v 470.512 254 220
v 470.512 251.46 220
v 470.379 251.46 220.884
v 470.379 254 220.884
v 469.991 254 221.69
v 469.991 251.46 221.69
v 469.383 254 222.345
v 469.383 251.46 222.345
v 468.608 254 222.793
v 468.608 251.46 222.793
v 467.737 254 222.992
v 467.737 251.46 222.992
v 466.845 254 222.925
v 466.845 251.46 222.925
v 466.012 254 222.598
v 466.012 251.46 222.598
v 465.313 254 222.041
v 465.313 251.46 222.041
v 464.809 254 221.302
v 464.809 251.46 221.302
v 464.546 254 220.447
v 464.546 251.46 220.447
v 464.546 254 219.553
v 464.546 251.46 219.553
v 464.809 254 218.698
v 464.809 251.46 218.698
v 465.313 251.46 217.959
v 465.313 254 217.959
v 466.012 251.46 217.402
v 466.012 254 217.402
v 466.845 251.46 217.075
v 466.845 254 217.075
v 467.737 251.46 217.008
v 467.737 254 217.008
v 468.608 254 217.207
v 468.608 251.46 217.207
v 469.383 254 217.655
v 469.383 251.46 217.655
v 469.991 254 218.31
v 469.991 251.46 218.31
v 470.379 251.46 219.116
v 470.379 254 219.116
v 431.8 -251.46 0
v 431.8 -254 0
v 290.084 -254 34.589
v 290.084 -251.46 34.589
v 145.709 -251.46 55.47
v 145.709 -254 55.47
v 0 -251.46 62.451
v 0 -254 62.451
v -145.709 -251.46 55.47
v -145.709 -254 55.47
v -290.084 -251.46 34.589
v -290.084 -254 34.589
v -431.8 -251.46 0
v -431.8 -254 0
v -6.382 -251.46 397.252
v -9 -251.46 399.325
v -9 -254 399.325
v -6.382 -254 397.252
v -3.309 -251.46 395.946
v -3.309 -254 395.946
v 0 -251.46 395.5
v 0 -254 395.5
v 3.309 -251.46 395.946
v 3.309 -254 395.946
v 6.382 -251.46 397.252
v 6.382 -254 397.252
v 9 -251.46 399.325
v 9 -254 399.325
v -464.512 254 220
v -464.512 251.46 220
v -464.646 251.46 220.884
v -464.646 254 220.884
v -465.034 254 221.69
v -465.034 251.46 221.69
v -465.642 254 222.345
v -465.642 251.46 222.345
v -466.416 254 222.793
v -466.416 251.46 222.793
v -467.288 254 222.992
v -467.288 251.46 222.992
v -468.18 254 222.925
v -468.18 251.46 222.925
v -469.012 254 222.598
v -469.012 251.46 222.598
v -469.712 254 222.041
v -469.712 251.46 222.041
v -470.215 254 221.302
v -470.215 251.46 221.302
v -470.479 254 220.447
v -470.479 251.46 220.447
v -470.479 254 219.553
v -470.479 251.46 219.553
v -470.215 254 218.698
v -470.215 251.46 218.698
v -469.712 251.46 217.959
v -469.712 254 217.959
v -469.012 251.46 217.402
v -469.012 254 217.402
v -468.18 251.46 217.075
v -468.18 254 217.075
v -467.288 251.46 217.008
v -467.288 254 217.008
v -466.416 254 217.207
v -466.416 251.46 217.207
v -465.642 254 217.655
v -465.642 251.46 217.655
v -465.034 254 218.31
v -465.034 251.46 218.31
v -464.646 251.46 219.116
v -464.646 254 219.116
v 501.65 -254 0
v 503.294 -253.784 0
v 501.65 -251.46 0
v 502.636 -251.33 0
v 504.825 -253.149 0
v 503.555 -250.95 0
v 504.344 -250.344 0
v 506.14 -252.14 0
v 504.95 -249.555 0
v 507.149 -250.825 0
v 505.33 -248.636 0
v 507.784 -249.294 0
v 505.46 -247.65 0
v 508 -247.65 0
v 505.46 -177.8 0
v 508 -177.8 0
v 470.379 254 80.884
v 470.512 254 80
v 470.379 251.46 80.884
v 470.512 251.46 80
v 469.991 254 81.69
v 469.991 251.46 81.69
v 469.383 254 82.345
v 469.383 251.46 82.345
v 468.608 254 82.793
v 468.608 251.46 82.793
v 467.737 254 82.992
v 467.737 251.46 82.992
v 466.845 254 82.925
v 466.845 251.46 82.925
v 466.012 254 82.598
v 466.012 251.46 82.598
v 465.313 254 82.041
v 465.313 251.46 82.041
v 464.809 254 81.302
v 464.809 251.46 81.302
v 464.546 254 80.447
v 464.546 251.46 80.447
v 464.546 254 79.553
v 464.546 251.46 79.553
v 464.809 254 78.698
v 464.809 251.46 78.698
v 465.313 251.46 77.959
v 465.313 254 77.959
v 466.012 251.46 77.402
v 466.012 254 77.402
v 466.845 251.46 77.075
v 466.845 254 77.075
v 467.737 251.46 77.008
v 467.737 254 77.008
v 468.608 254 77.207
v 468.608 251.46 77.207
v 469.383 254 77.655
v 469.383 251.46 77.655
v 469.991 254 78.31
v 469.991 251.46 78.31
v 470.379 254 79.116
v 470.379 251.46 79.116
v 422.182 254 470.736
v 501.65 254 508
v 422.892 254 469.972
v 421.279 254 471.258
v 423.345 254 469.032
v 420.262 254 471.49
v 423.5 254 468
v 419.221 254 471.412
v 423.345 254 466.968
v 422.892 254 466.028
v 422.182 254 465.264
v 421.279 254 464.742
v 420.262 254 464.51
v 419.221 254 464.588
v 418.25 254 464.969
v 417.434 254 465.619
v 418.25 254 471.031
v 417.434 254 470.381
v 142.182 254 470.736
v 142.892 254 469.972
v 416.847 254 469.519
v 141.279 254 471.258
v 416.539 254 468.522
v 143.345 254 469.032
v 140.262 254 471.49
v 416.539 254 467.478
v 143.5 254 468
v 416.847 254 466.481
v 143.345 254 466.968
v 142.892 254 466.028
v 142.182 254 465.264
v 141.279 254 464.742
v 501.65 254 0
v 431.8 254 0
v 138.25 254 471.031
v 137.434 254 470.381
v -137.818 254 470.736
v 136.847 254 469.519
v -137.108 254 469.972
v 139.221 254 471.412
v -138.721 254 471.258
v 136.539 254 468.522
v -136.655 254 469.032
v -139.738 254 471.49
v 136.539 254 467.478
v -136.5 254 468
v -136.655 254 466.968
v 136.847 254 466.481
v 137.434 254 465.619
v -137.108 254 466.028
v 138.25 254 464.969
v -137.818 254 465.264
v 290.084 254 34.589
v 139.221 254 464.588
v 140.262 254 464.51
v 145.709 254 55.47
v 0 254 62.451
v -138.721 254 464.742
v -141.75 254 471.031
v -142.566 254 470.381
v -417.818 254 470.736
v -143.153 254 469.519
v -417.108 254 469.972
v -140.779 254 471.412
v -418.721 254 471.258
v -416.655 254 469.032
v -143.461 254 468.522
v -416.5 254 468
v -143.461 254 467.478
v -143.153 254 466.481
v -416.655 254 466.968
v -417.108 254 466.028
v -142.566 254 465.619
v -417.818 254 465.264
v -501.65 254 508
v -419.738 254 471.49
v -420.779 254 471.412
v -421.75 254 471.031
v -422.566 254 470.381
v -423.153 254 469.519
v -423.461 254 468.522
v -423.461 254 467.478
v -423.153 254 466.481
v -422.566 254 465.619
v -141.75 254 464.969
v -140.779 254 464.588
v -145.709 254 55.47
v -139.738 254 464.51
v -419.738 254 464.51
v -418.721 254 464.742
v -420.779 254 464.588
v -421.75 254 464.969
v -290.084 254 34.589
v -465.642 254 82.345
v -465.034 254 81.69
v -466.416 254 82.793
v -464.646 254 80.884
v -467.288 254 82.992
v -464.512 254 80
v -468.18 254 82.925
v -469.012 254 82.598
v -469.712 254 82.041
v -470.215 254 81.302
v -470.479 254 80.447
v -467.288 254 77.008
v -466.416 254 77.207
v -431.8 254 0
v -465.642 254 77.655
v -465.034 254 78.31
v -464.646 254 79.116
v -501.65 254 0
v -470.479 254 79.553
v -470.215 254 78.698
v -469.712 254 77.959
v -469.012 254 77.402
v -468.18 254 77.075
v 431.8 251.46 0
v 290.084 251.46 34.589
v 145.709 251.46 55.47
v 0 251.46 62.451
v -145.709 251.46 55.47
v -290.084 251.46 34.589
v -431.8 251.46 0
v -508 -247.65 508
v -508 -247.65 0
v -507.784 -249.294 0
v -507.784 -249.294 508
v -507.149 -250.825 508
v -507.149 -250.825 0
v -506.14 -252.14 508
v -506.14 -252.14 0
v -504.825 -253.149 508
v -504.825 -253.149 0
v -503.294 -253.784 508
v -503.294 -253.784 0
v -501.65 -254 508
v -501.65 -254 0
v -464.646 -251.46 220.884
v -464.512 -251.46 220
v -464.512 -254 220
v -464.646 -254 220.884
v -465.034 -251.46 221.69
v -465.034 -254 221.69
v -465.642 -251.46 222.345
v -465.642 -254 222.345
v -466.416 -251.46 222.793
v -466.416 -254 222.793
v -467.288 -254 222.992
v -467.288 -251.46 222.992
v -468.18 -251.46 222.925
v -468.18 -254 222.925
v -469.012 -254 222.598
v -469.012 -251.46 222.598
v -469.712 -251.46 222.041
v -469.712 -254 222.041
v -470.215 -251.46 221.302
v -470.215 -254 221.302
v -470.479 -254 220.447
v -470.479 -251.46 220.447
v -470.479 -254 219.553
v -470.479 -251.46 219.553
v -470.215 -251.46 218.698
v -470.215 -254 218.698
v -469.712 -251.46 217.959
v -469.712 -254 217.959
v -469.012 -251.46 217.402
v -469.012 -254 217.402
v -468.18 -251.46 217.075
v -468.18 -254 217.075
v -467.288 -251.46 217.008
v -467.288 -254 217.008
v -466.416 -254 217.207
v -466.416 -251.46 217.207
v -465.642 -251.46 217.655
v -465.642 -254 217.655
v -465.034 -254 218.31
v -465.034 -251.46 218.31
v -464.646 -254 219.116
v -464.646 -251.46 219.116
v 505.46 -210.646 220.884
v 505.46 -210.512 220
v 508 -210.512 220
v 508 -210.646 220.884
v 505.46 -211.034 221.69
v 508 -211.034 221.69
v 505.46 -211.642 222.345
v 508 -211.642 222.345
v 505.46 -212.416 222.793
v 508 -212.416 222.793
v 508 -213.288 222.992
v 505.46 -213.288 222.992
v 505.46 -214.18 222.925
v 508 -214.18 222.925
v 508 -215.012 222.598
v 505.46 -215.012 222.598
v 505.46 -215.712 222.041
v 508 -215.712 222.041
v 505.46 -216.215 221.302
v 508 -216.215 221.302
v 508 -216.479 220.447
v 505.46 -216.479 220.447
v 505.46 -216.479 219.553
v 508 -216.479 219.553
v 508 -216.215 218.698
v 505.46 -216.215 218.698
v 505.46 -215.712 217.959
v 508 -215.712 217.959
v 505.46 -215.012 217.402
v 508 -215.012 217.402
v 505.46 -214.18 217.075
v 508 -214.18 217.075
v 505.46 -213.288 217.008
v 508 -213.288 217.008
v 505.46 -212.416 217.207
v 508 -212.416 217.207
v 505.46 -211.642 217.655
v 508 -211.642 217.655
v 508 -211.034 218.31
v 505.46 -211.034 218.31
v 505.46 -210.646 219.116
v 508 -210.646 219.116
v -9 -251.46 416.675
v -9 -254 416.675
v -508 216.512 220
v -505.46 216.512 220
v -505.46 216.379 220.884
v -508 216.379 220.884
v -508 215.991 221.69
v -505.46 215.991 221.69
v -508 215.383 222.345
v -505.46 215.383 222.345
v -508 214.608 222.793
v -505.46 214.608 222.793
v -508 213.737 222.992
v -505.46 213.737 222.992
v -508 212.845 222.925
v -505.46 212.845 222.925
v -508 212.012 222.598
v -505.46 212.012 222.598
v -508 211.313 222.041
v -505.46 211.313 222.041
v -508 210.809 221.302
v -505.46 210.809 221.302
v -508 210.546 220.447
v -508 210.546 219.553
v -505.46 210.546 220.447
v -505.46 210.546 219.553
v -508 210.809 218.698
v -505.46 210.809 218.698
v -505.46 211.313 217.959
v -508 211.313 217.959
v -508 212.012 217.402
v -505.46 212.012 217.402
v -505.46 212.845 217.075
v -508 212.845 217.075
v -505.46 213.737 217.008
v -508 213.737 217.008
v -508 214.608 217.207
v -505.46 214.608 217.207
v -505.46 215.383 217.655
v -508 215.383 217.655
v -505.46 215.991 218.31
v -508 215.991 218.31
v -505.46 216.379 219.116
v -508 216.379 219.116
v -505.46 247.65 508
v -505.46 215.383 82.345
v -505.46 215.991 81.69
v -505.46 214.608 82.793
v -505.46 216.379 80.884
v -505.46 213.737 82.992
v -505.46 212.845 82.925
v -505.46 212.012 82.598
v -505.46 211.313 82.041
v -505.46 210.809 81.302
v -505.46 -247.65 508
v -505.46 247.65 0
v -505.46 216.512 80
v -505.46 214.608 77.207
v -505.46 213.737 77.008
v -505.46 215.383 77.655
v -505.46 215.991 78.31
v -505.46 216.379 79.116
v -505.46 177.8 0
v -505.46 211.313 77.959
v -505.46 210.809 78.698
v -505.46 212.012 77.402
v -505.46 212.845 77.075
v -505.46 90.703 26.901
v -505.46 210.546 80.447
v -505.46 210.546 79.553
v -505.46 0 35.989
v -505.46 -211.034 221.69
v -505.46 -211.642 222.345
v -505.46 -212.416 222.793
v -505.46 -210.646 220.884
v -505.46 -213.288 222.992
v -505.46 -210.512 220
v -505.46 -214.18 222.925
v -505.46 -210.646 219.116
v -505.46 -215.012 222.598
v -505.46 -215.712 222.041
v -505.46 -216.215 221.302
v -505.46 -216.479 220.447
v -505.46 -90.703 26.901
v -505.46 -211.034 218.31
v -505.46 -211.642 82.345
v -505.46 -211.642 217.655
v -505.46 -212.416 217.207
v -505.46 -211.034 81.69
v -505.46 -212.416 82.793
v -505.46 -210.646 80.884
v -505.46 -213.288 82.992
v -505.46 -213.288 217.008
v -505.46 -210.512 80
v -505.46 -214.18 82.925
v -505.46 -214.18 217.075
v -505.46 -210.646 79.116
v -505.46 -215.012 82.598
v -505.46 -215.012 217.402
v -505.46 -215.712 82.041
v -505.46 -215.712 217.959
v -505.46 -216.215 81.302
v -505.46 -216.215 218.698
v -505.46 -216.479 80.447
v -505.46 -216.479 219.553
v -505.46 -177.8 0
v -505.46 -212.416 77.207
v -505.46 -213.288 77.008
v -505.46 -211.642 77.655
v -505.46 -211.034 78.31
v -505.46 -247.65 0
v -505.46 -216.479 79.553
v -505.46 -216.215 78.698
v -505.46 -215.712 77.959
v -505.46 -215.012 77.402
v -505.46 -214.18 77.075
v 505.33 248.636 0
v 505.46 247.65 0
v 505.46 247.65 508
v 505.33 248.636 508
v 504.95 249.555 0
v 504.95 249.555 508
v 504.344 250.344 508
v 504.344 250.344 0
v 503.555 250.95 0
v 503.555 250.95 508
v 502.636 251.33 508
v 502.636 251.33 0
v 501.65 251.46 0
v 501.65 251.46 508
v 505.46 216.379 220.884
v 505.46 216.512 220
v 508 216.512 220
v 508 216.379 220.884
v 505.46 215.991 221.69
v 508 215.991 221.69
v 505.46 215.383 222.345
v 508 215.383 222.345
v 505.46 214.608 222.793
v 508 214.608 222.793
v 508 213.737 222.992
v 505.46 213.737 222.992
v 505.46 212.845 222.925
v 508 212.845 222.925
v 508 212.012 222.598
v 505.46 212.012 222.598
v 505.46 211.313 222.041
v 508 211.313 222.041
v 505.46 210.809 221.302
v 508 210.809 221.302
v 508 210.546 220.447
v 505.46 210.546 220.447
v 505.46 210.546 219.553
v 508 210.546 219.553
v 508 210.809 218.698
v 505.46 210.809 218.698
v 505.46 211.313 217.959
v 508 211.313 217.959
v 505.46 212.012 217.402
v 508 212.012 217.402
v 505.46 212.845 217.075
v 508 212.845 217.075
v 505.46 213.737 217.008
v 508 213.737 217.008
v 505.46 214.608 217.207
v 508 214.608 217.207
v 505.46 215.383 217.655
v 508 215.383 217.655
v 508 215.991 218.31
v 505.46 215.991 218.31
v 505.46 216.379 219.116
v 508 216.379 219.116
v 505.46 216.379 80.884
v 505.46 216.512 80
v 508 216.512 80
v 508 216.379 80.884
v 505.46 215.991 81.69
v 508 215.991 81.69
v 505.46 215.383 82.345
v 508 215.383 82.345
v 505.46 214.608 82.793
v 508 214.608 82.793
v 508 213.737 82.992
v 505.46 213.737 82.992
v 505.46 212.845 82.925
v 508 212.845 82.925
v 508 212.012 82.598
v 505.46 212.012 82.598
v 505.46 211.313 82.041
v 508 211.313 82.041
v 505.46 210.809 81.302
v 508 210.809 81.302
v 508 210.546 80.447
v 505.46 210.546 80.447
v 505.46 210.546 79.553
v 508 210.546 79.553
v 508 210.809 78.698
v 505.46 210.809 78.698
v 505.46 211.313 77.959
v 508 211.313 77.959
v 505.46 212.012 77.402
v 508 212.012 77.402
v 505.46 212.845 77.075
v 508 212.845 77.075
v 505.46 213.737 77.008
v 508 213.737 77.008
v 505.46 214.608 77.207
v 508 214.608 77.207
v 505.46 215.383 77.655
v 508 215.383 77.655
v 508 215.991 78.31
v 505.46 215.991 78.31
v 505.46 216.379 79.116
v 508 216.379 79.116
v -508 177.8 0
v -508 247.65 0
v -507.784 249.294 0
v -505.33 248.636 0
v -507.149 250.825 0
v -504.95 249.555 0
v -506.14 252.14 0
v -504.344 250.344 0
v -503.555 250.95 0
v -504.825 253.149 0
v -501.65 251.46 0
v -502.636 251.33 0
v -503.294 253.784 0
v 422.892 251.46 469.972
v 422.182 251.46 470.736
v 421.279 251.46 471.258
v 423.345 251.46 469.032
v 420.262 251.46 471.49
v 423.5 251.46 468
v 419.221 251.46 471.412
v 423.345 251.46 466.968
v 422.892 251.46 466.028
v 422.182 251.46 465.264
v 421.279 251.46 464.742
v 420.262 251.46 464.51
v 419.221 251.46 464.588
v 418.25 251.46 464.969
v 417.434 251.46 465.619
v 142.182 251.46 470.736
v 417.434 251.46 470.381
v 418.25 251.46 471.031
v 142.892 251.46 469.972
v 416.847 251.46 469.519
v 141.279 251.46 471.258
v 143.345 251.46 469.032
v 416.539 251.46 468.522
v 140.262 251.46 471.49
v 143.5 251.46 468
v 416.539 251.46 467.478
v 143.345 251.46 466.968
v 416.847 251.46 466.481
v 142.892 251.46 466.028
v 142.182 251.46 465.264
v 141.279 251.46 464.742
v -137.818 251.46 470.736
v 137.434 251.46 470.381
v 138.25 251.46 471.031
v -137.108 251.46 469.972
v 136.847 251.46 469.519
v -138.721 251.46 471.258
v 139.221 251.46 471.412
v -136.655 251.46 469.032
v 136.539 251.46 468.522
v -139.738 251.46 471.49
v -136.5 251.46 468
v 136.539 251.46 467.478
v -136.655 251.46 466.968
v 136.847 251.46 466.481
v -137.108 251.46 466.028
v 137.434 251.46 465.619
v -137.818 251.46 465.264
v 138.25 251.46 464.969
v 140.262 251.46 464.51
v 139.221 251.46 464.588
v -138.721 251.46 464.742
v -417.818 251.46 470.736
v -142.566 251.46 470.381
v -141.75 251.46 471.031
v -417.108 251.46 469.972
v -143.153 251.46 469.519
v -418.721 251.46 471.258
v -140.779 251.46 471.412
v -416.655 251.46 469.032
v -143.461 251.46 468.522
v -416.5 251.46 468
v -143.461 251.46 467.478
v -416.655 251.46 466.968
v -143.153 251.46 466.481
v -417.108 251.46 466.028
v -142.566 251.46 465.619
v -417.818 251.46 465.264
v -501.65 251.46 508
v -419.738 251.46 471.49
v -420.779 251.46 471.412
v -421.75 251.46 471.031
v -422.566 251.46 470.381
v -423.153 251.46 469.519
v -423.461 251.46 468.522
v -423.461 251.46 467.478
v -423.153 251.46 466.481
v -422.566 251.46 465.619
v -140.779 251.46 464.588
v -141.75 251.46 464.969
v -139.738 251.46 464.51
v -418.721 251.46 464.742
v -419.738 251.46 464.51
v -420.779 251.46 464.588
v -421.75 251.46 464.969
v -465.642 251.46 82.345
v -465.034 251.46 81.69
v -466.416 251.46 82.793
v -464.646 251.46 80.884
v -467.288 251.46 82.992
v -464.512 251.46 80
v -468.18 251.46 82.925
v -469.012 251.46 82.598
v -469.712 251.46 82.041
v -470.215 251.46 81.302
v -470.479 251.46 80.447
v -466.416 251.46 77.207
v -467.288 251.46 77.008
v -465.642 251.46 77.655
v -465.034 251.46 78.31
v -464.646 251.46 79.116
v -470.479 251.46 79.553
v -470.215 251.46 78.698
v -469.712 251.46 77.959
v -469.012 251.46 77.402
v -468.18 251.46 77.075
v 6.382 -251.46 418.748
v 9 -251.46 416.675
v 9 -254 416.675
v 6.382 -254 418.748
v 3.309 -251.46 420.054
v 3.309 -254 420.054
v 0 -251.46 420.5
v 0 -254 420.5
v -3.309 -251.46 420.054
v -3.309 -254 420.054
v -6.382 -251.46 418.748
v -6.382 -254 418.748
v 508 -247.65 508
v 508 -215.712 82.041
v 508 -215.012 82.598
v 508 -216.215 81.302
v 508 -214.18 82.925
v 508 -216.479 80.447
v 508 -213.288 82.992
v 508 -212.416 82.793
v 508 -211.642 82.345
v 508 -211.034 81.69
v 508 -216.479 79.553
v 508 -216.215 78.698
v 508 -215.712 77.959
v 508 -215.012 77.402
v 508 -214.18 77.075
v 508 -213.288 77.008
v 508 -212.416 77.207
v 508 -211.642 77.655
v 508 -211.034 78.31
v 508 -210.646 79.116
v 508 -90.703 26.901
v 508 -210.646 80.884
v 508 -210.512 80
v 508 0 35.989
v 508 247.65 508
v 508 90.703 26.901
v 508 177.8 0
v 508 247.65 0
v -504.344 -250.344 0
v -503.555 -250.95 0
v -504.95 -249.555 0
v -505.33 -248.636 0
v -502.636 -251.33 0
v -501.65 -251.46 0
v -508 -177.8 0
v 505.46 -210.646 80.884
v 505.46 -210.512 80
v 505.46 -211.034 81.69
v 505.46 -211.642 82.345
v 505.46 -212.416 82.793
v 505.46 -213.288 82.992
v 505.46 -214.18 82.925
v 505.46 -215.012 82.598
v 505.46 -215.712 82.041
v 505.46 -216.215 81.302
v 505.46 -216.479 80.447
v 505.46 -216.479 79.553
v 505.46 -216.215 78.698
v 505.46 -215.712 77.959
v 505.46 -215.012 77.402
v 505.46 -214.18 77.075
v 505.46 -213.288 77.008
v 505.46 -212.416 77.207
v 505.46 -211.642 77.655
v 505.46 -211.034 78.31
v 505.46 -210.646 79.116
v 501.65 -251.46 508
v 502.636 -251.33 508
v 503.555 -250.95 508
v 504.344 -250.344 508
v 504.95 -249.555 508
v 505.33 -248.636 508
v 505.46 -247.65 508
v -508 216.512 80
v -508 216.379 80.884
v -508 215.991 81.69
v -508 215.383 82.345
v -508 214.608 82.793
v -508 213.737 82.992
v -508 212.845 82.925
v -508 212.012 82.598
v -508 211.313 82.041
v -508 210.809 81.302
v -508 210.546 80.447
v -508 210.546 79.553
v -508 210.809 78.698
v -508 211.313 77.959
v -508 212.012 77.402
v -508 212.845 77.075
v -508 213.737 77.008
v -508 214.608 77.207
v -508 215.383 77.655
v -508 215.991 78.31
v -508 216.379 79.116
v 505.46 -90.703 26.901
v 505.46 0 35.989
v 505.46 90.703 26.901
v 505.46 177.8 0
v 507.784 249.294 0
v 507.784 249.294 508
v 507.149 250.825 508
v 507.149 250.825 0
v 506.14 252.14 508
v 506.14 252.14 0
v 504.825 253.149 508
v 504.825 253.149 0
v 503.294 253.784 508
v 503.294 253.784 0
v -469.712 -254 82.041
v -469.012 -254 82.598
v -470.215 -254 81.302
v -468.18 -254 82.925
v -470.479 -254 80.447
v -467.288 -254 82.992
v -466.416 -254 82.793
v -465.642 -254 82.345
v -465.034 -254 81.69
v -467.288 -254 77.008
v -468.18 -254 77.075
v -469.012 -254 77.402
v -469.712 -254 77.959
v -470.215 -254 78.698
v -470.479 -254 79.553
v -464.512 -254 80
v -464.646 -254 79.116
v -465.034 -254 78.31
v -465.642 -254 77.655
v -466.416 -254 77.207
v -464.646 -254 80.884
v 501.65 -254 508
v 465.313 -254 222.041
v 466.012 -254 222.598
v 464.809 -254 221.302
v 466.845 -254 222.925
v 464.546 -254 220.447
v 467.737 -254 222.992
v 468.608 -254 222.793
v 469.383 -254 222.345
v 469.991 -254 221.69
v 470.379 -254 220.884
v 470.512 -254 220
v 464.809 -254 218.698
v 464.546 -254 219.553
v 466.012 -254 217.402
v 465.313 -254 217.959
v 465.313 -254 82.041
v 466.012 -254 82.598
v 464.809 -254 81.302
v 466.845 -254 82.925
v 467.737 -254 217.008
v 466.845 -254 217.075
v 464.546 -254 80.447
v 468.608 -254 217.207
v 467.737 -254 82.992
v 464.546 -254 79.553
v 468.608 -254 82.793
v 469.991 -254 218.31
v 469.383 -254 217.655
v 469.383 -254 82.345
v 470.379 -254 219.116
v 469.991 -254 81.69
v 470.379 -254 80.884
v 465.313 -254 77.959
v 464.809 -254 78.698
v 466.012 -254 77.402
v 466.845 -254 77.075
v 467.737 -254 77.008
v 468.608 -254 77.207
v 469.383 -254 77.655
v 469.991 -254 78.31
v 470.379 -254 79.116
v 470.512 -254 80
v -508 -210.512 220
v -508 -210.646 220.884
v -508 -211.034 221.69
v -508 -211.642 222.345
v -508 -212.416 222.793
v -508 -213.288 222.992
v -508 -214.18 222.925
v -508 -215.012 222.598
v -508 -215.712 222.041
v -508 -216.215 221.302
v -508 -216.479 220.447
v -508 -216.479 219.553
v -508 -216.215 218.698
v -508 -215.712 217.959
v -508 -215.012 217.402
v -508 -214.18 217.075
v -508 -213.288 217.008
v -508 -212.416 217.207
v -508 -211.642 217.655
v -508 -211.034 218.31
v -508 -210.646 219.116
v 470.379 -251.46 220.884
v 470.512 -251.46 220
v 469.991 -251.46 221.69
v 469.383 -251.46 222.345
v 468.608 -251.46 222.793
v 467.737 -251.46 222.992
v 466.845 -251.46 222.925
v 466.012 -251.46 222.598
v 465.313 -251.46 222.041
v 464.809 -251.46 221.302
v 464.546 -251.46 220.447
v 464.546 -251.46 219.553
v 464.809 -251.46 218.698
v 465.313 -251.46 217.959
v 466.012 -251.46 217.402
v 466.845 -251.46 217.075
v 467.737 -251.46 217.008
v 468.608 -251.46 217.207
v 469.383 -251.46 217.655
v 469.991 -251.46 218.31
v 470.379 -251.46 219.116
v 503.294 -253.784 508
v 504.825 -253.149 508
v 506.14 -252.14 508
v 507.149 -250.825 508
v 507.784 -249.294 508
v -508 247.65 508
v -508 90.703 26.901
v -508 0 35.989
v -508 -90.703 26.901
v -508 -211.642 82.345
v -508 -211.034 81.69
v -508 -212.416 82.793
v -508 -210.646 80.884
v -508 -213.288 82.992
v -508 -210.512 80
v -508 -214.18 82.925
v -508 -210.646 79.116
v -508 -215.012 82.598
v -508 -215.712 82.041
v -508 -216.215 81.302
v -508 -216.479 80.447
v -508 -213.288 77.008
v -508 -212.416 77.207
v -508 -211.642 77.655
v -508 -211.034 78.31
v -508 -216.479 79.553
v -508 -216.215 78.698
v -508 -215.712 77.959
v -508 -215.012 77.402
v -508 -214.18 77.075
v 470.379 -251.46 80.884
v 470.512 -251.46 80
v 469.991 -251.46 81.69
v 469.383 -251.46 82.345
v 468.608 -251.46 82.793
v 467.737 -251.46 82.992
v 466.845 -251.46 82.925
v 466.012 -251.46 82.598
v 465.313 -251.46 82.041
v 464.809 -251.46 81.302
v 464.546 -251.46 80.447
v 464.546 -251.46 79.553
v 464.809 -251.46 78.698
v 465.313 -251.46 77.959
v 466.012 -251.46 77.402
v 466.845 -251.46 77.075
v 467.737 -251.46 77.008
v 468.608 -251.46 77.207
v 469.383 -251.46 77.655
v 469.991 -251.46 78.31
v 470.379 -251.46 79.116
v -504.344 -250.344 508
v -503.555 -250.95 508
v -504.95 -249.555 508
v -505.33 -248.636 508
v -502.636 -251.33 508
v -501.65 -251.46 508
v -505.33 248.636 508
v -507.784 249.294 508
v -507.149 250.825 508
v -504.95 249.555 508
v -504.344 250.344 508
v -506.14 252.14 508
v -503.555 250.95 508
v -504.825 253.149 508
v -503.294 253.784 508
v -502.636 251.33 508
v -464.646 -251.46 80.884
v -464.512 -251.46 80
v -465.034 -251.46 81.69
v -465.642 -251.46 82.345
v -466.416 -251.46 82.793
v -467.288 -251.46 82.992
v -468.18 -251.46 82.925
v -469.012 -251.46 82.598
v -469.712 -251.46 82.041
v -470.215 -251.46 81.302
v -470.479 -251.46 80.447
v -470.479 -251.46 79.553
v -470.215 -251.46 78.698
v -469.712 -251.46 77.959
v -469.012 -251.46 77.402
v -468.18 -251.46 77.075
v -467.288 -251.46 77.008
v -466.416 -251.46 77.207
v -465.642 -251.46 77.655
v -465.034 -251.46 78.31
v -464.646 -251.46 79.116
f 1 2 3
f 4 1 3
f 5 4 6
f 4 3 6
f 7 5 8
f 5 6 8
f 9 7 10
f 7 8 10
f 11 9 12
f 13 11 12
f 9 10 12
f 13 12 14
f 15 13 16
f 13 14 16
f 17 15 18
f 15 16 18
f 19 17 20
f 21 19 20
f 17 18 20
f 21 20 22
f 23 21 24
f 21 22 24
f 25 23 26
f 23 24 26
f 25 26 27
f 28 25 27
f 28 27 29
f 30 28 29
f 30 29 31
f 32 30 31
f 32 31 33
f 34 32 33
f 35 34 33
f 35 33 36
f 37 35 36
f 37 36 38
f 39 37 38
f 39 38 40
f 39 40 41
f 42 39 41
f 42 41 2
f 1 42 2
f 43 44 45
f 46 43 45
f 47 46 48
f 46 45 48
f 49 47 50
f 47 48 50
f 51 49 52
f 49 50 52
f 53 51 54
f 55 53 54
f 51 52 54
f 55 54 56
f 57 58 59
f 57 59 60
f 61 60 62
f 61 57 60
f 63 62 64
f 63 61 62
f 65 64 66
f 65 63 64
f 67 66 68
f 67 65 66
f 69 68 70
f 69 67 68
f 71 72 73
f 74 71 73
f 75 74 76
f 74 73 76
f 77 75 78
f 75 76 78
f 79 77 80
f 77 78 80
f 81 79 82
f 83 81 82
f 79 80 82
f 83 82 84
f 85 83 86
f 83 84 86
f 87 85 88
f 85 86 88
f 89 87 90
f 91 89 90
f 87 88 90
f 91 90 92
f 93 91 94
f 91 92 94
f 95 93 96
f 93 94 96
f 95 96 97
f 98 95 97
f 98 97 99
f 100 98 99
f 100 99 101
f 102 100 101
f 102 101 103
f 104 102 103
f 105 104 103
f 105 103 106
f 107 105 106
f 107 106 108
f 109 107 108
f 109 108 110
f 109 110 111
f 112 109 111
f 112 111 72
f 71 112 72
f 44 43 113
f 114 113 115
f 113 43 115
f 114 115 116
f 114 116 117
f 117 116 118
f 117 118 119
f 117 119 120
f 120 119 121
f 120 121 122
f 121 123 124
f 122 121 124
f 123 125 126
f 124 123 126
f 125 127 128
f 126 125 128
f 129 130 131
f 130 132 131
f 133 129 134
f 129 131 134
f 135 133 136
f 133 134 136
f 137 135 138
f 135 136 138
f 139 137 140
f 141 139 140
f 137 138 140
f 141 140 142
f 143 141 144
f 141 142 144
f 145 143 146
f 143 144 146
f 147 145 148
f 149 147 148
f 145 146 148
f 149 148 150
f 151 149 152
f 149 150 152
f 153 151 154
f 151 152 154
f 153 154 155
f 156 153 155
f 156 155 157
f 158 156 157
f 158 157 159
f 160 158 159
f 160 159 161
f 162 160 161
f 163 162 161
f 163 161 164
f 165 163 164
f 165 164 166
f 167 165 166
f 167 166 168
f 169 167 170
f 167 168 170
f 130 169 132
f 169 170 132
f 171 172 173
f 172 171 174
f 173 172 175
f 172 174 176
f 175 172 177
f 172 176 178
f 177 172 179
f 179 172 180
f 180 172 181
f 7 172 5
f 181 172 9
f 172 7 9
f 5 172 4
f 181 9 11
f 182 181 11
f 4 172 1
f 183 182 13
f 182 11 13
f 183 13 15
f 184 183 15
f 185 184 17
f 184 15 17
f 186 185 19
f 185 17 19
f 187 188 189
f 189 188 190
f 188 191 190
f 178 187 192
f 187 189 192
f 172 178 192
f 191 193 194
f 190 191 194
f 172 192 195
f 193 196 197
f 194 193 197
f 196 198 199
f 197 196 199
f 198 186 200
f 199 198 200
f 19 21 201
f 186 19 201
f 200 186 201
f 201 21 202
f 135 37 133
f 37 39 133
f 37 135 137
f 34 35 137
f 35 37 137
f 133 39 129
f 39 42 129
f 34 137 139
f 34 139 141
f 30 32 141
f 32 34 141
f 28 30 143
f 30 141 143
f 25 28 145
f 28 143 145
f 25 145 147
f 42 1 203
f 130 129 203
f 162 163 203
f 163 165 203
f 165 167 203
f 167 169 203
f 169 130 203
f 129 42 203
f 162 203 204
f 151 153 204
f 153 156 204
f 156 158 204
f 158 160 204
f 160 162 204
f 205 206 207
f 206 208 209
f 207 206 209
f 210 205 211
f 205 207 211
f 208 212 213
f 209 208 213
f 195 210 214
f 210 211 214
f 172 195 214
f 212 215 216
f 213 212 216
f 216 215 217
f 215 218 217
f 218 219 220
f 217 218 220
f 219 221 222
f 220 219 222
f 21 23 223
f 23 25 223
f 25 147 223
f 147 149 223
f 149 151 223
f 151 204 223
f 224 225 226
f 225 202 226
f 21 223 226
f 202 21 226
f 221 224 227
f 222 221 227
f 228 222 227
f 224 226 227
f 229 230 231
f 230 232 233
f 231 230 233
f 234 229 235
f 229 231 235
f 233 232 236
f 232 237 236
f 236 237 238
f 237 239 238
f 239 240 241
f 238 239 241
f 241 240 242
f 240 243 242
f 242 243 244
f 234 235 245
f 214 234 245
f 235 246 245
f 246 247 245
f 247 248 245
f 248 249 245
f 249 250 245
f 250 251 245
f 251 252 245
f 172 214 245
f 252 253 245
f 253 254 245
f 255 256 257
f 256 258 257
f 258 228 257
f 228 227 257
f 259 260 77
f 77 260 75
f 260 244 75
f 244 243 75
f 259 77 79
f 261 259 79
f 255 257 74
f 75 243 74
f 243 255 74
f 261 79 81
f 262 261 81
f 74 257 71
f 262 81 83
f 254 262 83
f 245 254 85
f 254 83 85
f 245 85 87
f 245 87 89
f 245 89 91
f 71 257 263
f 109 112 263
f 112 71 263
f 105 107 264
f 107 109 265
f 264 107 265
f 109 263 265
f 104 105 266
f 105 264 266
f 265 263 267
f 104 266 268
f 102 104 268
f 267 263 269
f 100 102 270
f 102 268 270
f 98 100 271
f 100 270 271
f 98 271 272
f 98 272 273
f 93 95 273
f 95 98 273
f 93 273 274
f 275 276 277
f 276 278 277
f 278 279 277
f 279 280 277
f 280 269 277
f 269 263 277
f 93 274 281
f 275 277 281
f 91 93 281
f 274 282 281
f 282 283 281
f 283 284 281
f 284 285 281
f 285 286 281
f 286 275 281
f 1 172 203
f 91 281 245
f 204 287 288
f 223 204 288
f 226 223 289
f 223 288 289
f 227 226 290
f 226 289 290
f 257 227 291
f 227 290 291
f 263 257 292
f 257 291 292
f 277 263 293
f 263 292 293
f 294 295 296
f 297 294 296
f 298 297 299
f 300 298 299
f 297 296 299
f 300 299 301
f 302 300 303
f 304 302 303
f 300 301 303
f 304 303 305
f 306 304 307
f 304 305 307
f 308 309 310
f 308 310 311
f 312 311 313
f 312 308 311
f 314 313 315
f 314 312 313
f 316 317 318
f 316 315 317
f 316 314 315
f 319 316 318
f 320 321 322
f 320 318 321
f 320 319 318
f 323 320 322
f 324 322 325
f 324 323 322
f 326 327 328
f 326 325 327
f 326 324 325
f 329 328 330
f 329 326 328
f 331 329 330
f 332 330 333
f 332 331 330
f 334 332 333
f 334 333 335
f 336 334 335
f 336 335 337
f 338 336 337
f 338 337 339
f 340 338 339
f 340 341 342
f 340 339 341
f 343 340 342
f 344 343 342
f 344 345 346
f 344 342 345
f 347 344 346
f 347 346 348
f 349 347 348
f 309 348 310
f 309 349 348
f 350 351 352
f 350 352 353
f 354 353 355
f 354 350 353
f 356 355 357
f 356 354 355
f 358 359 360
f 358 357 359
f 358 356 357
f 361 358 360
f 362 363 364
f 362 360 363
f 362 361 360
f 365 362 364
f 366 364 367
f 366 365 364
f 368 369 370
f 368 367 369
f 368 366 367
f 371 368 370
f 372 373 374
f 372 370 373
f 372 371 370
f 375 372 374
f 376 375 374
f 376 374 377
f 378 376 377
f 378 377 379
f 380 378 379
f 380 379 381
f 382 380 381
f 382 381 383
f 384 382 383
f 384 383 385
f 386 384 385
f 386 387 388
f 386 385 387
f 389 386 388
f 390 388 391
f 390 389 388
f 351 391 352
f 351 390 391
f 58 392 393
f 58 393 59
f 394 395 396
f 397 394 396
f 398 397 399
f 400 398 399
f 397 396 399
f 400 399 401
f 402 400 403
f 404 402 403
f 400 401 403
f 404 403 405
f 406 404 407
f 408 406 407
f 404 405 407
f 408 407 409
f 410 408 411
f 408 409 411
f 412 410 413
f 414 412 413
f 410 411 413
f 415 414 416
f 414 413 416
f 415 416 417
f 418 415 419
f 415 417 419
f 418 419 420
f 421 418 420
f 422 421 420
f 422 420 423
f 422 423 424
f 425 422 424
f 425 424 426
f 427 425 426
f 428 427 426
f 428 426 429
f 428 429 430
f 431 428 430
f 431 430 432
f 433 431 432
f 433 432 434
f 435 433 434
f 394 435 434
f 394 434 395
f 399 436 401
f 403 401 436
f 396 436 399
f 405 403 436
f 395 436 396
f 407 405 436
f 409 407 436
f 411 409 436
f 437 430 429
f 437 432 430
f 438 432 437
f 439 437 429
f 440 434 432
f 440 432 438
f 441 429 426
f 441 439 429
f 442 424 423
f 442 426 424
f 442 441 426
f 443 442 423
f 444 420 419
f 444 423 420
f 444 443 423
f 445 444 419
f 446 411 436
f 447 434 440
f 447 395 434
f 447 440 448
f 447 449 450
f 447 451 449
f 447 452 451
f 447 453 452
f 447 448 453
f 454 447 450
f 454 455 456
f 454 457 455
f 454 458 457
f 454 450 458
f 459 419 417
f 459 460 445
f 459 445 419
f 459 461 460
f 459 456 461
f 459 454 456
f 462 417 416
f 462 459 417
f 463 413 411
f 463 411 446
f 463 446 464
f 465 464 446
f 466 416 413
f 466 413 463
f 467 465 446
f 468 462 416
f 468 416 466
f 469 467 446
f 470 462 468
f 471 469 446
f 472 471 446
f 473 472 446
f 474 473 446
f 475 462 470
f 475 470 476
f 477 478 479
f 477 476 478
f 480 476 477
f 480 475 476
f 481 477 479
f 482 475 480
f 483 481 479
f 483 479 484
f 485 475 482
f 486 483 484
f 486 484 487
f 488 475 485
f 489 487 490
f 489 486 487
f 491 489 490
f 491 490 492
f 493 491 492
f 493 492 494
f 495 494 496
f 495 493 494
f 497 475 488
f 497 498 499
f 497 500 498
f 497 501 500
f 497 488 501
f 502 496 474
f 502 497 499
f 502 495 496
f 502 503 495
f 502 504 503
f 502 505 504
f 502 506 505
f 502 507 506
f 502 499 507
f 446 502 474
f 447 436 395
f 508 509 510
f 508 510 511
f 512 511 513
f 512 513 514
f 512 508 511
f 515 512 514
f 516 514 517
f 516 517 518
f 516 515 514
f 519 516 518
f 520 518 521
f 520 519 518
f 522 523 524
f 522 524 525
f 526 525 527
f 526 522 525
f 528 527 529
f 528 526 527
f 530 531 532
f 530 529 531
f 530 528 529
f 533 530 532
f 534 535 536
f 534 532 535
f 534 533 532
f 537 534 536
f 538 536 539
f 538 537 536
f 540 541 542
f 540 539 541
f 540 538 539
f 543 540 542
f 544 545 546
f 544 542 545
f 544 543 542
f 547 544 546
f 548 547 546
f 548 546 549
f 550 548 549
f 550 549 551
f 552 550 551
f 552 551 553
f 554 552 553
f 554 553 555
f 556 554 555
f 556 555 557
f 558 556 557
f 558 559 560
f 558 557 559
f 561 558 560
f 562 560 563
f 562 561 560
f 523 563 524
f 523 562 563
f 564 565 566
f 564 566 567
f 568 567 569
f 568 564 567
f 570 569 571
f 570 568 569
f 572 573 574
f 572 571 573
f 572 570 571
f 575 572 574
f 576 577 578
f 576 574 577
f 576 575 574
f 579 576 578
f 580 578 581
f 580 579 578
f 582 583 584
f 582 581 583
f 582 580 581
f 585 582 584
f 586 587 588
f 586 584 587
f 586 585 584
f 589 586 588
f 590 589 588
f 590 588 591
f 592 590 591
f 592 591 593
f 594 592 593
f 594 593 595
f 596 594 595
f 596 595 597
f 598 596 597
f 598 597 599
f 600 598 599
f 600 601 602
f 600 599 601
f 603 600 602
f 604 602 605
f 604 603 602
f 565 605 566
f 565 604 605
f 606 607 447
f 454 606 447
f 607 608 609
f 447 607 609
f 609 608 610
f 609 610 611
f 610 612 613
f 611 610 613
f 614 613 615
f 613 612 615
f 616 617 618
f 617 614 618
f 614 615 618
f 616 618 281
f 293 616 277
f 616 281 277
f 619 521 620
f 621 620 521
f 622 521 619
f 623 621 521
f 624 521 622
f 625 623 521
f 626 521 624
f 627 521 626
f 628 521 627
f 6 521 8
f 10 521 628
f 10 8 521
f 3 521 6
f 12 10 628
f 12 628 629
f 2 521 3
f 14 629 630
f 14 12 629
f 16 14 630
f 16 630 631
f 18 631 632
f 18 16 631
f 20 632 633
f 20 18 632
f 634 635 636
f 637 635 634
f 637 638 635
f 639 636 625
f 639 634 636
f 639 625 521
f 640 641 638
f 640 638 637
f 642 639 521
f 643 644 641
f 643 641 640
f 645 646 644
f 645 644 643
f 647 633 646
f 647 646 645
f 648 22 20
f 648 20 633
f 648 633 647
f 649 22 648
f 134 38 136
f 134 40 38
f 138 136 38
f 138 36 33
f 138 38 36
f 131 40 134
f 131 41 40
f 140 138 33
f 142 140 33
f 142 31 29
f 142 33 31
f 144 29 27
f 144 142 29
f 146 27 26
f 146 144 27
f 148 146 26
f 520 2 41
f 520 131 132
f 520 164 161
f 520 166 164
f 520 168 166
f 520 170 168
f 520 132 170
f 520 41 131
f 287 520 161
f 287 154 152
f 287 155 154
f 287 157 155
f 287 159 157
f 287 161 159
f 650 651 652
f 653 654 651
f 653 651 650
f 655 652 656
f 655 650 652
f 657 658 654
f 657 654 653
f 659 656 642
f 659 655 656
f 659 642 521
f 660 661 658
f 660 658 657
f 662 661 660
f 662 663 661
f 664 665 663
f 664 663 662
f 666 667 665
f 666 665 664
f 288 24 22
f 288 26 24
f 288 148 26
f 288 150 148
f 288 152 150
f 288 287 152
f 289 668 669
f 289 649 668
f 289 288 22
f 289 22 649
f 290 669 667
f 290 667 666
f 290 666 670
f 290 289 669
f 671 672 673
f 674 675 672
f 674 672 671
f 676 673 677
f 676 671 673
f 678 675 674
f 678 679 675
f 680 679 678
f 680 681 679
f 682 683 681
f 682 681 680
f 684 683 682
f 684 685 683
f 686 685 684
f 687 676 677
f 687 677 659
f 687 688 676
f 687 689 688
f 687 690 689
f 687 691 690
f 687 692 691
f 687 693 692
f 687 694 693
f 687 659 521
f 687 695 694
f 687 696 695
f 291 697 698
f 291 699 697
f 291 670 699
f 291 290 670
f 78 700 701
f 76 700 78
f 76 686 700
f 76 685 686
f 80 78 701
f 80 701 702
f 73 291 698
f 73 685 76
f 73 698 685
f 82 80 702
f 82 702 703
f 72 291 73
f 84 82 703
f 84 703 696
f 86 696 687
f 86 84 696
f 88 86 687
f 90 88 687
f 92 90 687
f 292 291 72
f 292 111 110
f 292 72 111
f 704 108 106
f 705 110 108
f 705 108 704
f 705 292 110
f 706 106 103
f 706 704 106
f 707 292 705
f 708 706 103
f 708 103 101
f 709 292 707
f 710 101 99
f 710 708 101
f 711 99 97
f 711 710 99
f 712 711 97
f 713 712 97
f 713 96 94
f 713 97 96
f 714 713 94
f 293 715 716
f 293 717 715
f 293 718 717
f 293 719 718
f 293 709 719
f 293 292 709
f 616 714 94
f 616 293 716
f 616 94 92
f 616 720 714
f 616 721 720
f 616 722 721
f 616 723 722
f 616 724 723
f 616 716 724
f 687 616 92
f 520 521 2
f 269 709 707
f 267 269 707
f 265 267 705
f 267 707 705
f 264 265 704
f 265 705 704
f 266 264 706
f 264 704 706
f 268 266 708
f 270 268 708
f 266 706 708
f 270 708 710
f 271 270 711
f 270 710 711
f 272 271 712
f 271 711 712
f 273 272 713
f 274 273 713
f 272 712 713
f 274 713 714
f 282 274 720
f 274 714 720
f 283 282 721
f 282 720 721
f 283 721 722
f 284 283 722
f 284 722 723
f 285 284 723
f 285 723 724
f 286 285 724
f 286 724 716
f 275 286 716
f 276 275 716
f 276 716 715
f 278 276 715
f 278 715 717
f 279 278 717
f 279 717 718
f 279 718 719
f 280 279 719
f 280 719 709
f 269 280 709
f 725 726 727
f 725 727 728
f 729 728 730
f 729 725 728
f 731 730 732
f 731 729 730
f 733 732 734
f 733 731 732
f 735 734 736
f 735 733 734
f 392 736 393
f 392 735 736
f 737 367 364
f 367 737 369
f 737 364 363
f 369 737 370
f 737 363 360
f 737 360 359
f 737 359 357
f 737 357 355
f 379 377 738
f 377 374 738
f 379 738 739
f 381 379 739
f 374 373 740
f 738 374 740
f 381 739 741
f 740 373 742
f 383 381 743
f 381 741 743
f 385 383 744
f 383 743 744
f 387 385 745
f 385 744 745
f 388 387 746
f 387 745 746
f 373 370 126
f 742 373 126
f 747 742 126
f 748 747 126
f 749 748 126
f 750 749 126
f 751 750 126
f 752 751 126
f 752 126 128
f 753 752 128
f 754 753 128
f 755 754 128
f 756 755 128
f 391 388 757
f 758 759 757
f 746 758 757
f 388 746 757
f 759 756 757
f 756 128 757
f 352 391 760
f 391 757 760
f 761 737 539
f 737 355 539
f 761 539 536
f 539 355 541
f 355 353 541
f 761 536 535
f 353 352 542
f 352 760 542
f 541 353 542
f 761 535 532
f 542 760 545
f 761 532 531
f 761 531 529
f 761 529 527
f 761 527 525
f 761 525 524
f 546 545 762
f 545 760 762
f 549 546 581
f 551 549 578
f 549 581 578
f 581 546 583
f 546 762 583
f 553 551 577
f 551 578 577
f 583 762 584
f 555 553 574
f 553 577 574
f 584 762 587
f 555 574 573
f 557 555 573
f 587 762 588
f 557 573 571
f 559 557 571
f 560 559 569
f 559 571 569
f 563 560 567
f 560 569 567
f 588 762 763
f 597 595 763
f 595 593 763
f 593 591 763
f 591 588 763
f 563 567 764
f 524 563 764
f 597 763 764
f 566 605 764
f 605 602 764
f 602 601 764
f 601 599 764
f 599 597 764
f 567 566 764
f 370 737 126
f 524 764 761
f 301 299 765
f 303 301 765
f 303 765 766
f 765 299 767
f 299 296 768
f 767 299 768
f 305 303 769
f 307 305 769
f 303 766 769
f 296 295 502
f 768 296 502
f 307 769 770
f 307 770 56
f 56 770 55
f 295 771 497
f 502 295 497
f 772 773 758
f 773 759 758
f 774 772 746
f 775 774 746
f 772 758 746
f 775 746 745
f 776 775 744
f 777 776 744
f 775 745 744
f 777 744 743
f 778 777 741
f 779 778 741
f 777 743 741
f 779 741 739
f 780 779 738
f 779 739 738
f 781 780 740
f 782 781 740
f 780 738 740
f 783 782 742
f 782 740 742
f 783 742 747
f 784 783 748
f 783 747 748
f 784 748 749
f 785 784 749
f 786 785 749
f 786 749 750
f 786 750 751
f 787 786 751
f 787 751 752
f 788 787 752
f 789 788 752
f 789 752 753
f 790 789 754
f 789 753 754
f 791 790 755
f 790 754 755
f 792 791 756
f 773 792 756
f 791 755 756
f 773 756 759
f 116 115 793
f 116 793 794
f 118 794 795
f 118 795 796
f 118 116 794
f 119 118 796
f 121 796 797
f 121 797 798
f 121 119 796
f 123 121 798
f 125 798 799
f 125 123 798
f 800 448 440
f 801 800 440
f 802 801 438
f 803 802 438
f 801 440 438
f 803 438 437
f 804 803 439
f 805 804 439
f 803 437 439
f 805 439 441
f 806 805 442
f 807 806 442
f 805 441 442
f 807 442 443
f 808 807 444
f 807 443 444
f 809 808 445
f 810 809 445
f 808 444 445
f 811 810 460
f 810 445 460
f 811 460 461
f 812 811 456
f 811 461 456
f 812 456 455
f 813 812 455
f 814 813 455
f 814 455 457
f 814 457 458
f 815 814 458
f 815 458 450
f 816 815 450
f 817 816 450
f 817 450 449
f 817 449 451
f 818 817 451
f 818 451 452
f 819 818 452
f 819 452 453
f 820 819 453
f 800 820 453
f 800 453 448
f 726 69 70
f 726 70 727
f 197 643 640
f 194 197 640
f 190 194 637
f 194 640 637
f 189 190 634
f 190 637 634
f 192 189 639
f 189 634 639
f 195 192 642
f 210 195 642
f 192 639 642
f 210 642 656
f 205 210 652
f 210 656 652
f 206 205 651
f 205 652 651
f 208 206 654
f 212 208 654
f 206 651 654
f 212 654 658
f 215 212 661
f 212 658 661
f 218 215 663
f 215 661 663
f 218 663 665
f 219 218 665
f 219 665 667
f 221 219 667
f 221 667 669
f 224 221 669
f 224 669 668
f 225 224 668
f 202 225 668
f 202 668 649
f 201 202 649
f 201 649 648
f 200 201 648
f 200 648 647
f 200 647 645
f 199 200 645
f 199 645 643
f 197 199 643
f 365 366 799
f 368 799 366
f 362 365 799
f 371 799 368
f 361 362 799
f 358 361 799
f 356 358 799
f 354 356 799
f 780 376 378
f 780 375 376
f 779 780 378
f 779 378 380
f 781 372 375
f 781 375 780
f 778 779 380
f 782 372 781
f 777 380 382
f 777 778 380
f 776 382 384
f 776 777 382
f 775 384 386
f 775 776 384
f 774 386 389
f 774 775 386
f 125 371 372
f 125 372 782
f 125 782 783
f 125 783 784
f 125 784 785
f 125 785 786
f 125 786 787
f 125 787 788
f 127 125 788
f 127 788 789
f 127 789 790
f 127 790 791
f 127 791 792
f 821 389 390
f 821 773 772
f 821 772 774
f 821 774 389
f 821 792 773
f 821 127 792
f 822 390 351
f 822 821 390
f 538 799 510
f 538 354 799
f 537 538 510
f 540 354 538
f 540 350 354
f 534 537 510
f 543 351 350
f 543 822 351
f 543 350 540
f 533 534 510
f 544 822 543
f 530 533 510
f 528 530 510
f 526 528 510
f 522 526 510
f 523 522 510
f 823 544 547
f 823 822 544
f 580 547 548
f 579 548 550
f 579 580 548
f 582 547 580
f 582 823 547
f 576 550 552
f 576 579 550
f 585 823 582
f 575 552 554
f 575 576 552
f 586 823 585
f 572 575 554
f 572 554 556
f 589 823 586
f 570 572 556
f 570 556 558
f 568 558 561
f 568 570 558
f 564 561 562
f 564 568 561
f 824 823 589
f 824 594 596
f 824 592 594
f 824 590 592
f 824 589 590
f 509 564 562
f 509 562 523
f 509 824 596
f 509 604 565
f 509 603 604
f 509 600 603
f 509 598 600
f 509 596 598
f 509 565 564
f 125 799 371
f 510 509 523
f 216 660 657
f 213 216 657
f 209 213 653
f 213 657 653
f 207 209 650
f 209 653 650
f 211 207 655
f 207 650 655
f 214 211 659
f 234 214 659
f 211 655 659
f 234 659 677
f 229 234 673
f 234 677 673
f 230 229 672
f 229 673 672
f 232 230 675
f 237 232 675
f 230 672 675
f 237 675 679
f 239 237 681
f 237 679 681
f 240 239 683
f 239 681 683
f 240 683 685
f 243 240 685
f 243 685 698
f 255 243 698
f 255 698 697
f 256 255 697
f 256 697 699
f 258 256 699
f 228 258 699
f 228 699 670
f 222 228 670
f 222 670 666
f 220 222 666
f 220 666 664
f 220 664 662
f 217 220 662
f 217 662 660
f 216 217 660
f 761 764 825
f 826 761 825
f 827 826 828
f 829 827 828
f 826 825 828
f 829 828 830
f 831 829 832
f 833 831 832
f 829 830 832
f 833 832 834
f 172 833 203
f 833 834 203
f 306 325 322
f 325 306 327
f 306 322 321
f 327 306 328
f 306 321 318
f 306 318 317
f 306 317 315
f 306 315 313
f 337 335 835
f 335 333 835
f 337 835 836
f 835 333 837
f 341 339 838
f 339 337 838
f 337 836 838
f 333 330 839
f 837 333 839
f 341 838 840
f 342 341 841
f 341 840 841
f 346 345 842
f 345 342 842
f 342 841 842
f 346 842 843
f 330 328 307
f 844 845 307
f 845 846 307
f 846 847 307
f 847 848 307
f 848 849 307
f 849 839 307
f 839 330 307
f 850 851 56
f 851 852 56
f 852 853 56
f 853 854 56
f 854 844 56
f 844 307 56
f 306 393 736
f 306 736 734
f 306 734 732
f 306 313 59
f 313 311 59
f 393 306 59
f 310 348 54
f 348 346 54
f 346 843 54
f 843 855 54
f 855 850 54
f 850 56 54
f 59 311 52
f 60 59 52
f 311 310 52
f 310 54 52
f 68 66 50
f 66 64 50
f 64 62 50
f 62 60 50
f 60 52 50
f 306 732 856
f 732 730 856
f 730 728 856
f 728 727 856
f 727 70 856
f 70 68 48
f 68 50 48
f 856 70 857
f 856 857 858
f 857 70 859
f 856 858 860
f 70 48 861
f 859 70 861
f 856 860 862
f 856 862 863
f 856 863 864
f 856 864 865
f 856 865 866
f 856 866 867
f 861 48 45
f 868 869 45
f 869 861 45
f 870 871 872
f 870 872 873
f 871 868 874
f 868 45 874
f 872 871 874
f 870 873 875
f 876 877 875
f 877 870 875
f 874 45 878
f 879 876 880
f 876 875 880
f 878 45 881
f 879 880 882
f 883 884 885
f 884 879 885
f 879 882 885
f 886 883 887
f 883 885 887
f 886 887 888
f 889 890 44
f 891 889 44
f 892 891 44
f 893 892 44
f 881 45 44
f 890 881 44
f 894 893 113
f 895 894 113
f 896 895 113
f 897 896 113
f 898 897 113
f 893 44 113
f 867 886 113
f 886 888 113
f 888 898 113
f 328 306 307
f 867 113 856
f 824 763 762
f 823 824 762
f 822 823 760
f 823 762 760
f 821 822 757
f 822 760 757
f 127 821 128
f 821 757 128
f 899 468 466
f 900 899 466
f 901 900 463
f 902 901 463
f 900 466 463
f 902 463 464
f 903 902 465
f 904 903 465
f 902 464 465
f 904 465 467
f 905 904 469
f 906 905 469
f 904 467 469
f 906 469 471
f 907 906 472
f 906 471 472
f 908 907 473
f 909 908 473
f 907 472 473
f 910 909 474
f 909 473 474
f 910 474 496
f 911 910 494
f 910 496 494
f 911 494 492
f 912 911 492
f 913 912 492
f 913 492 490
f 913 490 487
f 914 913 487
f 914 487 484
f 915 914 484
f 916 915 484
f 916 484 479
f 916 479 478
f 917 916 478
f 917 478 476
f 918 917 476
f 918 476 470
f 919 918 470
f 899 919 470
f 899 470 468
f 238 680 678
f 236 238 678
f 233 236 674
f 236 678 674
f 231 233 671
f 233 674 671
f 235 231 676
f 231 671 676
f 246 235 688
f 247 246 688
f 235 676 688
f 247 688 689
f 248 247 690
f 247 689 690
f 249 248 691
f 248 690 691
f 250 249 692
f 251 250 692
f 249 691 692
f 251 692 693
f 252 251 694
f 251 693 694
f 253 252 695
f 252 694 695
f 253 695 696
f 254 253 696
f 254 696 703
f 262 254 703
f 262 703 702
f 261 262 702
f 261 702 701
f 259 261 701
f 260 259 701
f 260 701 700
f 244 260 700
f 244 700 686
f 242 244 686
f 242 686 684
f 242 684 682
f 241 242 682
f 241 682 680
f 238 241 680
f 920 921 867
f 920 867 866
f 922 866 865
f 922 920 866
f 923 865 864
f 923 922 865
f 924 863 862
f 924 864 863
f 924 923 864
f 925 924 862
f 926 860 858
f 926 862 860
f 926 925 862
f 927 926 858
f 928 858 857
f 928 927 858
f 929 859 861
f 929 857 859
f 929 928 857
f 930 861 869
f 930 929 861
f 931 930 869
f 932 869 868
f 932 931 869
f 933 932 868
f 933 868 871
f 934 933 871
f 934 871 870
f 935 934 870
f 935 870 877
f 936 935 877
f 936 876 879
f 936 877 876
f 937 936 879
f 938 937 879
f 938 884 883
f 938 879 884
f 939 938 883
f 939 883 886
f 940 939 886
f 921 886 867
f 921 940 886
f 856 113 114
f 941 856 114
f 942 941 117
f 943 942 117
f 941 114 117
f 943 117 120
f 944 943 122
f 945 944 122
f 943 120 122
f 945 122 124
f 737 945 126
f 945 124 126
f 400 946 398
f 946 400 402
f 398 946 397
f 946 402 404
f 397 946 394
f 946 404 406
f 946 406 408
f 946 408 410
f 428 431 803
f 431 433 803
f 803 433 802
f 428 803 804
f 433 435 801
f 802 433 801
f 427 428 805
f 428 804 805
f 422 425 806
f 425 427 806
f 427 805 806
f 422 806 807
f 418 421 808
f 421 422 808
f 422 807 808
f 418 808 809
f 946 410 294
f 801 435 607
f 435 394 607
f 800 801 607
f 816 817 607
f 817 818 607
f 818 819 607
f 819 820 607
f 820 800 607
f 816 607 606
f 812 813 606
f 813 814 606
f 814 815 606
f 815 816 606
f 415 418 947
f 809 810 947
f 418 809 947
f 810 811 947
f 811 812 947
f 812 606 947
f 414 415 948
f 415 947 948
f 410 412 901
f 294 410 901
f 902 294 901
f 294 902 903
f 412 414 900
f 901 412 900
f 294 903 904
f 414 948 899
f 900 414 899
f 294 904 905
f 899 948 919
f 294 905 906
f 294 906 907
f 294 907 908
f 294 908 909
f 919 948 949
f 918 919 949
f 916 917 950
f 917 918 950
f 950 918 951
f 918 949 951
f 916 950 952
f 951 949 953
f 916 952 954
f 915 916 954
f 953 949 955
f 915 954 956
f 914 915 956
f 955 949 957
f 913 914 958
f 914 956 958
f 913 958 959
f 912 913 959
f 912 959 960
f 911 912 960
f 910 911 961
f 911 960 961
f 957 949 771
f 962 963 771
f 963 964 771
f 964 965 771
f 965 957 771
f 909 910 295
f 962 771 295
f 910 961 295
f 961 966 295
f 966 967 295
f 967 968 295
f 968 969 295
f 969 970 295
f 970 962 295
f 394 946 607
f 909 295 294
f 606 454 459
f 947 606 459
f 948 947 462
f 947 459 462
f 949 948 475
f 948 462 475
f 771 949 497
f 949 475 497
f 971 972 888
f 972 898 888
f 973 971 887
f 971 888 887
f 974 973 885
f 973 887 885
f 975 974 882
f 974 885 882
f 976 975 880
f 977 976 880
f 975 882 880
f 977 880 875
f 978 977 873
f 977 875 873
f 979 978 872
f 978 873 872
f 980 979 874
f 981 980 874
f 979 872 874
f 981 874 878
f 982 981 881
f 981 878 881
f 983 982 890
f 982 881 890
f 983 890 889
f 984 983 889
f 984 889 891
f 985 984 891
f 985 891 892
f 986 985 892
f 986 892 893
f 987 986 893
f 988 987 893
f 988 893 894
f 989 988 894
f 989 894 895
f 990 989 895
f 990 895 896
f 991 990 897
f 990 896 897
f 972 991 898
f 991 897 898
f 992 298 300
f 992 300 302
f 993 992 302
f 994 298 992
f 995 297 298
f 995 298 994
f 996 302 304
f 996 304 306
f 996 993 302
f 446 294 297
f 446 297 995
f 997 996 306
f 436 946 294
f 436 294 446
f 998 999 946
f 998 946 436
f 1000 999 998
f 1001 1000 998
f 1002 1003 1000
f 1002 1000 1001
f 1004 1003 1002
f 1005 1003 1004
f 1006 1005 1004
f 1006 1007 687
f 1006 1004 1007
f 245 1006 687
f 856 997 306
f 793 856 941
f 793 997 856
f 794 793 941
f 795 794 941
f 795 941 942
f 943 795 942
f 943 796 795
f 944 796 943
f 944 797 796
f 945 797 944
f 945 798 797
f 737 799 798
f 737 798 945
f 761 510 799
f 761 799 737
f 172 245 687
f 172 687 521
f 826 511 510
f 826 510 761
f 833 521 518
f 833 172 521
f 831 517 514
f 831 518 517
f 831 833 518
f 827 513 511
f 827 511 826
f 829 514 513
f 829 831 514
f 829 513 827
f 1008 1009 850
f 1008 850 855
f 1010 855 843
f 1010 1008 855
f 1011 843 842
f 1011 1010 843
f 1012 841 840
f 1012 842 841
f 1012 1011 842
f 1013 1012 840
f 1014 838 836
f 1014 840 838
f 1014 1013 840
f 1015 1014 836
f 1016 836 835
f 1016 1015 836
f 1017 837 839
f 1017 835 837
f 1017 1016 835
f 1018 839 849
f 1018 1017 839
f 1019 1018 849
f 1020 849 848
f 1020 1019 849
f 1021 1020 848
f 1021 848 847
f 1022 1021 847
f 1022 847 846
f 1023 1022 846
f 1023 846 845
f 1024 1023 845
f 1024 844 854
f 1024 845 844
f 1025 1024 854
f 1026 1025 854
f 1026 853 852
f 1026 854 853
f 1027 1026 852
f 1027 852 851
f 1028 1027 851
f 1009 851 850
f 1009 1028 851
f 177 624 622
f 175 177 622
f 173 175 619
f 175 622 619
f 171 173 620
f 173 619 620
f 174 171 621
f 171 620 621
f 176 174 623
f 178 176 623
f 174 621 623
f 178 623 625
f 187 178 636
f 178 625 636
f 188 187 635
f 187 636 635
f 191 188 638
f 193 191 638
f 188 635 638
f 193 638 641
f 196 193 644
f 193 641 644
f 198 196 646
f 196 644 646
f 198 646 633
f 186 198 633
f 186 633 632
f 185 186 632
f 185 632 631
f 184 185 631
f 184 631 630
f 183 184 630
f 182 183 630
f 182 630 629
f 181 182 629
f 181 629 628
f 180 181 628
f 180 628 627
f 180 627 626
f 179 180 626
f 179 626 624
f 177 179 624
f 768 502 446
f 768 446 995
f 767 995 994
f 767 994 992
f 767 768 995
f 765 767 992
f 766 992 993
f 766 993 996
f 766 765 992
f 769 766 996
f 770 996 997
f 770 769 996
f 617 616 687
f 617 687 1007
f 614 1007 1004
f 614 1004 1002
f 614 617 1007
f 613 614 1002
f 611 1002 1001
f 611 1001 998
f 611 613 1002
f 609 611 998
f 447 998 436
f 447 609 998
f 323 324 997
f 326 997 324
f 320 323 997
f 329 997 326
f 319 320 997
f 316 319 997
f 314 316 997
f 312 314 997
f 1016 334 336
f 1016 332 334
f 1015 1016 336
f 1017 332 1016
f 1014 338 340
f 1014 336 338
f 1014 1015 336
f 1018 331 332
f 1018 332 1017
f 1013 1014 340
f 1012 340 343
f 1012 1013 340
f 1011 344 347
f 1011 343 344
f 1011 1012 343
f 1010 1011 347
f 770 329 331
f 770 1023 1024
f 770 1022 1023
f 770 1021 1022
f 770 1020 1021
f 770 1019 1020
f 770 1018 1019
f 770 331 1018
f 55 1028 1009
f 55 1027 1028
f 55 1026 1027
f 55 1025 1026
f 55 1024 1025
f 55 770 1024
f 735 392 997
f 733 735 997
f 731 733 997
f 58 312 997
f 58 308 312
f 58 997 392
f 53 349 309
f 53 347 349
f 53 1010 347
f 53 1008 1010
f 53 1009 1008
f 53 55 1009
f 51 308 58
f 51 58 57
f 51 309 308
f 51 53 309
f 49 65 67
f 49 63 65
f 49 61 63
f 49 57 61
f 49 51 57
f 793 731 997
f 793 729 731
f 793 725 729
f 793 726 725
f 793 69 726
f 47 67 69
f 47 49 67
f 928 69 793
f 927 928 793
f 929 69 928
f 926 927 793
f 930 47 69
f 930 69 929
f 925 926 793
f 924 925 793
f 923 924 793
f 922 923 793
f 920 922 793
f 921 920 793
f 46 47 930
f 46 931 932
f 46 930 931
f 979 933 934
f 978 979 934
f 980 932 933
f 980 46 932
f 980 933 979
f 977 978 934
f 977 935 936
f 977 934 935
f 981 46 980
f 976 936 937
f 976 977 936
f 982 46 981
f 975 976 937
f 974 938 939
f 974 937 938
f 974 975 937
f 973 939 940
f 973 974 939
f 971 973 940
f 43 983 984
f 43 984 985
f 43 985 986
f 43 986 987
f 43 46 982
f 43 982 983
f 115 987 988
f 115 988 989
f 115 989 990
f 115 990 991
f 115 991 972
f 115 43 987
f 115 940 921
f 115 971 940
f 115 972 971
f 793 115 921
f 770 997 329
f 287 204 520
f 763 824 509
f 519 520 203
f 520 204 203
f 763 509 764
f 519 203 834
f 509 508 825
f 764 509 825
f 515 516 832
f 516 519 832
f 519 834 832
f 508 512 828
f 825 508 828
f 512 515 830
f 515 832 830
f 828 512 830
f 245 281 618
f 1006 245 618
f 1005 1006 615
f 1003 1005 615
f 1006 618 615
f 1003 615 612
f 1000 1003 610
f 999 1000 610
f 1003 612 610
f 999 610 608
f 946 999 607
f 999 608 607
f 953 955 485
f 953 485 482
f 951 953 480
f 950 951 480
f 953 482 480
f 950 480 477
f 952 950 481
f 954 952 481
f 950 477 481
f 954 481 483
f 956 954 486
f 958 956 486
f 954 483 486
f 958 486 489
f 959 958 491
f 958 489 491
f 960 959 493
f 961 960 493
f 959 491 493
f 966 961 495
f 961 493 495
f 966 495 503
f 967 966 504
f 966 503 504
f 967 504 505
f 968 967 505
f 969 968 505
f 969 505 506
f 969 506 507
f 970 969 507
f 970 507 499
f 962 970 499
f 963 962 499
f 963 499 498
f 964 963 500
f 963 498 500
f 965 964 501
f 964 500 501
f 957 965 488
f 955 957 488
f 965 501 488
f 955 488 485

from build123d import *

# Parameters (mm, degrees)
F1_DEPTH  = 508
F2_T      = -2.54
F4_DEPTH  = 381
F6_DEPTH  = 635
F7_R      = 3.5
F8_DEPTH  = 254.001
F10_DEPTH = 254.001
F11_R     = 3
F12_DEPTH = 381
F13_R     = 3
F14_DEPTH = 1270


with BuildPart() as f1:
    # F0 (on Top) → F1 (new body)
    with BuildSketch(Plane.XY):
        with BuildLine():
            ThreePointArc((508, 247.65), (506.140128, 252.140128), (501.65, 254))
            Line((501.65, 254), (-501.65, 254))
            ThreePointArc((-501.65, 254), (-506.140128, 252.140128), (-508, 247.65))
            Line((-508, 247.65), (-508, -247.65))
            ThreePointArc((-508, -247.65), (-506.140128, -252.140128), (-501.65, -254))
            Line((-501.65, -254), (501.65, -254))
            ThreePointArc((501.65, -254), (506.140128, -252.140128), (508, -247.65))
            Line((508, -247.65), (508, 247.65))
        make_face()
    extrude(amount=F1_DEPTH)

    # F2
    f2_openings = [f1.faces().sort_by_distance(p)[0] for p in [
        (0, 0, 508),
        (0, 0, 0),
    ]]
    offset(amount=F2_T, openings=f2_openings)

    # F3 (on Front) → F4 (cut, symmetric)
    with BuildSketch(Plane.XZ):
        with BuildLine():
            ThreePointArc((431.8, 0), (0, 62.451246), (-431.8, 0))
            Line((-431.8, 0), (431.8, 0))
        make_face()
    extrude(amount=F4_DEPTH, both=True, mode=Mode.SUBTRACT)

    # F5 (on Right) → F6 (cut, symmetric)
    with BuildSketch(Plane.YZ):
        with BuildLine():
            Line((-177.8, 0), (177.8, 0))
            ThreePointArc((177.8, 0), (0, 35.988652), (-177.8, 0))
        make_face()
    extrude(amount=F6_DEPTH, both=True, mode=Mode.SUBTRACT)

    # F7 (on Front) → F8 (cut, through all)
    with BuildSketch(Plane.XZ):
        with Locations((420, 468)):
            Circle(F7_R)
        with Locations((140, 468)):
            Circle(F7_R)
        with Locations((-140, 468)):
            Circle(F7_R)
        with Locations((-420, 468)):
            Circle(F7_R)
    extrude(amount=-F8_DEPTH, mode=Mode.SUBTRACT)

    # F9 (on Front) → F10 (cut, through all)
    with BuildSketch(Plane.XZ):
        with BuildLine():
            Line((-9, 416.674676), (-9, 399.325324))
            ThreePointArc((-9, 399.325324), (0, 395.5), (9, 399.325324))
            Line((9, 399.325324), (9, 416.674676))
            ThreePointArc((9, 416.674676), (0, 420.5), (-9, 416.674676))
        make_face()
    extrude(amount=F10_DEPTH, mode=Mode.SUBTRACT)

    # F11 (on Front) → F12 (cut, symmetric)
    with BuildSketch(Plane.XZ):
        with Locations((-467.5124, 220)):
            Circle(F11_R)
        with Locations((-467.5124, 80)):
            Circle(F11_R)
        with Locations((467.5124, 220)):
            Circle(F11_R)
        with Locations((467.5124, 80)):
            Circle(F11_R)
    extrude(amount=F12_DEPTH, both=True, mode=Mode.SUBTRACT)

    # F13 (on Right) → F14 (cut, symmetric)
    with BuildSketch(Plane.YZ):
        with Locations((213.5124, 220)):
            Circle(F13_R)
        with Locations((213.5124, 80)):
            Circle(F13_R)
        with Locations((-213.5124, 220)):
            Circle(F13_R)
        with Locations((-213.5124, 80)):
            Circle(F13_R)
    extrude(amount=F14_DEPTH, both=True, mode=Mode.SUBTRACT)


solid = f1.part
